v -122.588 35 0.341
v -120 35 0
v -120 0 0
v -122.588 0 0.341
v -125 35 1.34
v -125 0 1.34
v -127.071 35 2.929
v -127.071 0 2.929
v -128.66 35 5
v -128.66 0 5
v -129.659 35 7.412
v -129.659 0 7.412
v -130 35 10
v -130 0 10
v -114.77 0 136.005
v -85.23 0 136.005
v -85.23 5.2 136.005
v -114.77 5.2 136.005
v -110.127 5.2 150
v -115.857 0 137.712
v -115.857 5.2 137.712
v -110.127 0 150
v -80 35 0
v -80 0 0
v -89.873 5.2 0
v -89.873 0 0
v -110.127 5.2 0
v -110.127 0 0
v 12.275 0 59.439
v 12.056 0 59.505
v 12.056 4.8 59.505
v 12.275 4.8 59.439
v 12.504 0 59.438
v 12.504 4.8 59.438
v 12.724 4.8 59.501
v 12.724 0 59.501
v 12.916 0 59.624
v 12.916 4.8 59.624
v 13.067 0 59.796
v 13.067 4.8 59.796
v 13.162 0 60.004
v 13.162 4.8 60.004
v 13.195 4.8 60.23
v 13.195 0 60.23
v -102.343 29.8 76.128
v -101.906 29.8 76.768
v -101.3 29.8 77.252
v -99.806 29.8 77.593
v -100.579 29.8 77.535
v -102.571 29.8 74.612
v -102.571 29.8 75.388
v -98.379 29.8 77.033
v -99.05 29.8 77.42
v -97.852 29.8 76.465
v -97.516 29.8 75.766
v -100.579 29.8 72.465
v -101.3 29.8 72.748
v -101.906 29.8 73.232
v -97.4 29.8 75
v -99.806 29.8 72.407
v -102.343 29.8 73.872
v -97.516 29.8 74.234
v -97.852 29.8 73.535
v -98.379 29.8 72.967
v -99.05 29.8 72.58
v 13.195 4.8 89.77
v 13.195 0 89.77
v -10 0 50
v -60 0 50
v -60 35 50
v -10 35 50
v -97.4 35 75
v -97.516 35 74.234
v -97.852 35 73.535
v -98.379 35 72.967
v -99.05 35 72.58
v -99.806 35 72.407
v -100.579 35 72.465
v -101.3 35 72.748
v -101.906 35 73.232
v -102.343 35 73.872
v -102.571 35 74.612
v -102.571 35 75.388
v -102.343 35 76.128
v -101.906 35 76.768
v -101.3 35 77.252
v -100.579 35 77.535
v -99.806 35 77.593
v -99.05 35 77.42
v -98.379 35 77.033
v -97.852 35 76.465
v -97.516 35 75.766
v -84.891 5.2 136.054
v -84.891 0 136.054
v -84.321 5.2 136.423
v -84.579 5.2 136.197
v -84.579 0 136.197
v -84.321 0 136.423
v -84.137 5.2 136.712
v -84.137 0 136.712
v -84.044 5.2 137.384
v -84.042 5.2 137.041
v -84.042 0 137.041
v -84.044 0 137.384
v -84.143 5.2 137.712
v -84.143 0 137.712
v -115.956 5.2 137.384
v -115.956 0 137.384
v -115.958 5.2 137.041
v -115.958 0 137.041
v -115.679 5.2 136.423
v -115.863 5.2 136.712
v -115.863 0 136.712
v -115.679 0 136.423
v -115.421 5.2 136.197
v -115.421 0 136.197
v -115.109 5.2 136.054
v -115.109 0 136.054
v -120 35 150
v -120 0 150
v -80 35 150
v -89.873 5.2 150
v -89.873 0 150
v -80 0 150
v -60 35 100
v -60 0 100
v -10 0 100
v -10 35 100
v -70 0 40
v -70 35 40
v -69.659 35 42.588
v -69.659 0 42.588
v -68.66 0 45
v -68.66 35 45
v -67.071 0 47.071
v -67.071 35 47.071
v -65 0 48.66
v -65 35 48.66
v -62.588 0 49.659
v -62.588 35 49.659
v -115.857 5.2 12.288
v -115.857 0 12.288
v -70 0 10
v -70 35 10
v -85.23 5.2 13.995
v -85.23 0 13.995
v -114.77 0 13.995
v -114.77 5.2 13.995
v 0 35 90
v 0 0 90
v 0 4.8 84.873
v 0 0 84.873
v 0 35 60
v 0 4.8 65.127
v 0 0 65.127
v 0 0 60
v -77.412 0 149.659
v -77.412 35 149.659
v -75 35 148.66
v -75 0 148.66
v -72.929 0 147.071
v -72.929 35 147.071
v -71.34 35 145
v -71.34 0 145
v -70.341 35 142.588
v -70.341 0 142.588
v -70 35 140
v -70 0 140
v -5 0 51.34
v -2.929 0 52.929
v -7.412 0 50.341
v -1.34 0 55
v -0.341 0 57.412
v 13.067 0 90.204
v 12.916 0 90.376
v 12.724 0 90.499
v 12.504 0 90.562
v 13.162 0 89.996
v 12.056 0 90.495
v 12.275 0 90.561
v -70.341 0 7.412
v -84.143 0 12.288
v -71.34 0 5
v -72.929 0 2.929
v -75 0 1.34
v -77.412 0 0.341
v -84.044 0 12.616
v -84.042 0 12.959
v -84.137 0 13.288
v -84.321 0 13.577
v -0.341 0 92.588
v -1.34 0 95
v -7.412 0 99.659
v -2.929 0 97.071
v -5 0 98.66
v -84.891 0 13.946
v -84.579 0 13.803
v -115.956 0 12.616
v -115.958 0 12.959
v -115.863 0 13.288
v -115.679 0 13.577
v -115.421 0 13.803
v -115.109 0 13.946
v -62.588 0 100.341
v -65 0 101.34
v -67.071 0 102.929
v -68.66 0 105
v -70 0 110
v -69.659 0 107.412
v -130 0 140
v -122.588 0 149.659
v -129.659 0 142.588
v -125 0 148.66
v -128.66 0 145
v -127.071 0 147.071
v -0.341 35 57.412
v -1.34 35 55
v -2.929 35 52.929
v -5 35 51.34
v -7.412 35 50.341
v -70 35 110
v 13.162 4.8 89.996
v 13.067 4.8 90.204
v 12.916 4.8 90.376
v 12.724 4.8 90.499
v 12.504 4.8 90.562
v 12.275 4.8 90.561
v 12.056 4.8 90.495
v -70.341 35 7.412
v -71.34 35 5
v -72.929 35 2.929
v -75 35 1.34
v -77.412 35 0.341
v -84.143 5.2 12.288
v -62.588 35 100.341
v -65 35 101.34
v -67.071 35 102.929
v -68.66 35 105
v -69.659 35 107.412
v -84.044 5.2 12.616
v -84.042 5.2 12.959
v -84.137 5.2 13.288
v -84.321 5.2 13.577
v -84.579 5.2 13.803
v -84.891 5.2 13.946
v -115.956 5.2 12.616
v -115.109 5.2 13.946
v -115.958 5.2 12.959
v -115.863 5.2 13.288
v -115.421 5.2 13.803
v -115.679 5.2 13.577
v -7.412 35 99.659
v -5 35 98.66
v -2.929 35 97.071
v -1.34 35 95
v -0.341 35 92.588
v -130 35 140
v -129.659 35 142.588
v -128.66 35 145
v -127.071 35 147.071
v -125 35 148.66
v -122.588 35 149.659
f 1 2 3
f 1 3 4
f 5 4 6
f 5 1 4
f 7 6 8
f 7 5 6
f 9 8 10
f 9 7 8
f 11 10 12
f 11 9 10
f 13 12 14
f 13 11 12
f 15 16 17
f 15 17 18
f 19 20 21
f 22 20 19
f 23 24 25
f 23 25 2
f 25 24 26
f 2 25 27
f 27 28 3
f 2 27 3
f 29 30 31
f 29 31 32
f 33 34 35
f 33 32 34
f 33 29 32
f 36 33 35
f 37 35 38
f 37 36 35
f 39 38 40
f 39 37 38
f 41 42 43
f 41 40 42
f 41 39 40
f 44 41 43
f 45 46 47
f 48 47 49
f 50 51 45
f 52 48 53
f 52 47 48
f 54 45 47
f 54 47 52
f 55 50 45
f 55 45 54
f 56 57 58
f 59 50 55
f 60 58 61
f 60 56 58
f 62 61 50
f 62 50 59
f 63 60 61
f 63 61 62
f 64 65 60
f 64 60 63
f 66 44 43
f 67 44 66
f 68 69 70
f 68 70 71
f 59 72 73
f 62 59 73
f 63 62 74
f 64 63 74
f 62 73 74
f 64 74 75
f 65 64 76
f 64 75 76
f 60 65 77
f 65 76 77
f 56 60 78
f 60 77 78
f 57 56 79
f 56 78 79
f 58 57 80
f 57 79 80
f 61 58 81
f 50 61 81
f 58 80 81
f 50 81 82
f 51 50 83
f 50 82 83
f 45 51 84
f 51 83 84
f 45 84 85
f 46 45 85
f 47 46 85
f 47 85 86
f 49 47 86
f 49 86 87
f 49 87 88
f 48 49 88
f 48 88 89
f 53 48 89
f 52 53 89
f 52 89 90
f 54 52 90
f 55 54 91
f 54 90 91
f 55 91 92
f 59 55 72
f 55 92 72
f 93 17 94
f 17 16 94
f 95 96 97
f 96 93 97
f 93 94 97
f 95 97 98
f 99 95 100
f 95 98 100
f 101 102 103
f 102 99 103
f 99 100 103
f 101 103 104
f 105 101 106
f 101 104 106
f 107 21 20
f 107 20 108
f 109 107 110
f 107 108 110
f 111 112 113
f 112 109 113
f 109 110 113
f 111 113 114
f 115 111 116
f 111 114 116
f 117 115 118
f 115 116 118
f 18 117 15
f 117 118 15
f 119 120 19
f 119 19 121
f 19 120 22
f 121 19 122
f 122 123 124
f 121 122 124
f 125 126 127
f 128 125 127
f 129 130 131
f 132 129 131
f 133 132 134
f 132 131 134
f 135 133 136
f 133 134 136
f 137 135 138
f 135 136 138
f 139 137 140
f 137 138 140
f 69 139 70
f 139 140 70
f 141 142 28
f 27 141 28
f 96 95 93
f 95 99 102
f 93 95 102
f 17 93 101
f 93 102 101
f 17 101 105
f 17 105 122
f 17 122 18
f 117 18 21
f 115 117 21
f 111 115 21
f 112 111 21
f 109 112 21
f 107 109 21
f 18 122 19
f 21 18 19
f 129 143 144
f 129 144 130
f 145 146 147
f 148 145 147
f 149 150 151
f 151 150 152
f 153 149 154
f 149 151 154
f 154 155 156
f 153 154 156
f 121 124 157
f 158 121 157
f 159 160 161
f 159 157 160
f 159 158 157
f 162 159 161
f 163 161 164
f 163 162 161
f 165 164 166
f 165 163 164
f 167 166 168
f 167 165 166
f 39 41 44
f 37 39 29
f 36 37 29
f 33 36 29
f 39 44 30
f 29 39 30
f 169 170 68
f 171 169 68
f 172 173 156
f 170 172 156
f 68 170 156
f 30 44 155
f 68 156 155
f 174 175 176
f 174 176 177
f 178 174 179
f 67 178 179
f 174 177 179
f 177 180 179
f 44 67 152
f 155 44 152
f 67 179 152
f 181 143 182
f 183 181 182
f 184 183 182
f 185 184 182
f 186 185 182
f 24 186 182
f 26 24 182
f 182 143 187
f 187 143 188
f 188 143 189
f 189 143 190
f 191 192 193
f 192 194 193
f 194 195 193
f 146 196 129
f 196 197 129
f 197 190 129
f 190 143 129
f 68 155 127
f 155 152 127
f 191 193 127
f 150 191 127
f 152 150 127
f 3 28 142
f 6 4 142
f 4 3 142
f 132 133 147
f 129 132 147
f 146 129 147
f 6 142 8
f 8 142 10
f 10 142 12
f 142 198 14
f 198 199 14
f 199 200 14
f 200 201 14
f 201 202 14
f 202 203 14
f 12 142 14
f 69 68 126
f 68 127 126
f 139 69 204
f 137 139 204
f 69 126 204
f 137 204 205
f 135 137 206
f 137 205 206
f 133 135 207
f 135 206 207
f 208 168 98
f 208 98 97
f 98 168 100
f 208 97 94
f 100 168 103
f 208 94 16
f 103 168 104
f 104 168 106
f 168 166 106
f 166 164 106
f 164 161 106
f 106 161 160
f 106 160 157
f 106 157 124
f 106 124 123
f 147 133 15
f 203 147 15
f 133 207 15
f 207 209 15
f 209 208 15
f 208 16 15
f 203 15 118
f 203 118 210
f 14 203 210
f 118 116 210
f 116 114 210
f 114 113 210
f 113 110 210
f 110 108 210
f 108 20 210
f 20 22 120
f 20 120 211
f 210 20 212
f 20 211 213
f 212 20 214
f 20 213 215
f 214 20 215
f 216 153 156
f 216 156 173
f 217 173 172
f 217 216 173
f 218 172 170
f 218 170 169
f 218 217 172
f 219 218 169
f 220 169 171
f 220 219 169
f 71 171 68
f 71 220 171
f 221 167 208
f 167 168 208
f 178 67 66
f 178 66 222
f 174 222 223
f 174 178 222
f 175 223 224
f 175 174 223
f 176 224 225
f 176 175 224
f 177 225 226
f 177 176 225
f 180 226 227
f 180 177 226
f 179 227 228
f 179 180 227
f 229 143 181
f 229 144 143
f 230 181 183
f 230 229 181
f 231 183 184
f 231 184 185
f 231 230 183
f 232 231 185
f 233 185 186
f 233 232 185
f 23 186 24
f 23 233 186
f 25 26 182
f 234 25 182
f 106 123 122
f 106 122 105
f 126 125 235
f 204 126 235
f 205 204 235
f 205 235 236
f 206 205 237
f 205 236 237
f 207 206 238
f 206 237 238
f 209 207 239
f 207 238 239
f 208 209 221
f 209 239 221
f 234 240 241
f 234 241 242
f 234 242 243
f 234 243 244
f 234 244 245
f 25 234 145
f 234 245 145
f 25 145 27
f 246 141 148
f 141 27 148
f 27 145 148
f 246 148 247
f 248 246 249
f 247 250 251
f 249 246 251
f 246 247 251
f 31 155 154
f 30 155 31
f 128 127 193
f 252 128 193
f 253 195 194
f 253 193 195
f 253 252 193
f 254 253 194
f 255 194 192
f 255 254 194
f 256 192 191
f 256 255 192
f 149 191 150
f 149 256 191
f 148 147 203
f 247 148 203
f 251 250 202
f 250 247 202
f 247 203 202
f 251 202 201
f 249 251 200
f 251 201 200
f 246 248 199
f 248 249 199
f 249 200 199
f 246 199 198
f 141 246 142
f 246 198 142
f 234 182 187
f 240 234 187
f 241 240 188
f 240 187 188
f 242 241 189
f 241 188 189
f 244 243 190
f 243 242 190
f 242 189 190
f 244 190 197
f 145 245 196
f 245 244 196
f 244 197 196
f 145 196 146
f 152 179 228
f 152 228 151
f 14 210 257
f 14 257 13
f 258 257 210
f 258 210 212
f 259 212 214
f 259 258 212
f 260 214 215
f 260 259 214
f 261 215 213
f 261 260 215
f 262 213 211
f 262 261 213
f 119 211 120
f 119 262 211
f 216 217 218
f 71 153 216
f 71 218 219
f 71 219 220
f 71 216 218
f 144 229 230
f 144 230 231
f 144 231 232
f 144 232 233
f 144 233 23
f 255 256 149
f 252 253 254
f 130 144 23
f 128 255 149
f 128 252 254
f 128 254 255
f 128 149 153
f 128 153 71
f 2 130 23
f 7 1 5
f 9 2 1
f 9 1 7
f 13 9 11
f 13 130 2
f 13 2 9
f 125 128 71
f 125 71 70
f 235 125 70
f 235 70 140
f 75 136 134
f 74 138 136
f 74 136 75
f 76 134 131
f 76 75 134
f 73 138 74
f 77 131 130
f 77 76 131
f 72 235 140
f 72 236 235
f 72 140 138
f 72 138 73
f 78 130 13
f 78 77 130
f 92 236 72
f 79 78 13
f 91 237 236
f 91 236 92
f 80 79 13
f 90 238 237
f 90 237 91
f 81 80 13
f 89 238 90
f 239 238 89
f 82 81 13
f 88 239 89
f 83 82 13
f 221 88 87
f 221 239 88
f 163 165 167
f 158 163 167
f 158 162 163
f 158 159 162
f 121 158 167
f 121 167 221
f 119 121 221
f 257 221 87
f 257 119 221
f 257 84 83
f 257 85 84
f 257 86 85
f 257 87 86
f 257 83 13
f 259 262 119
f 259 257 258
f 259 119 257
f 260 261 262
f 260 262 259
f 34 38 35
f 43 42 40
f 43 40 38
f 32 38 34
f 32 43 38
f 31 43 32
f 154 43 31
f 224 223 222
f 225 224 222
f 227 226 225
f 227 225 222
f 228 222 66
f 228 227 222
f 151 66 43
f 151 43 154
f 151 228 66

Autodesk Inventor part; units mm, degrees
ref_plane "YZ Plane" through (0, 0, 0) normal (1, 0, 0) x (0, 1, 0)
ref_plane "XZ Plane" through (0, 0, 0) normal (0, 1, 0) x (-1, 0, 0)
ref_plane "XY Plane" through (0, 0, 0) normal (0, 0, 1) x (1, 0, 0)
sketch "Sketch1" plane through (0, 0, 0) normal (0, 1, 0) x (-1, 0, 0)
  line L0 (0, 0) -> (200, 0)
  line L1 (200, 0) -> (200, 150)
  line L2 (200, 150) -> (0, 150)
  line L3 (0, 150) -> (0, 0)
  line L4 (110.1274, 0) -> (89.8726, 0)
  line L5 (85.2304, 13.9946) -> (100, 13.9946)
  line L6 (89.8726, 0) -> (84.1428, 12.2875)
  arc A0 (85.2304, 13.9946) -> (84.1428, 12.2875) centre (85.2304, 12.7946) ccw
  line L7 (100, 13.9946) -> (114.7696, 13.9946)
  line L8 (110, 0.2) -> (110, 13.6303) construction
  arc A1 (115.8572, 12.2875) -> (114.7696, 13.9946) centre (114.7696, 12.7946) ccw
  line L9 (115.8572, 12.2875) -> (110.1274, 0)
  arc A2 (114.7696, 136.0054) -> (115.8572, 137.7125) centre (114.7696, 137.2054) ccw
  line L10 (100, 136.0054) -> (114.7696, 136.0054)
  line L11 (115.8572, 137.7125) -> (110.1274, 150)
  line L12 (110, 149.8) -> (110, 136.3697) construction
  line L13 (85.2304, 136.0054) -> (100, 136.0054)
  arc A3 (84.1428, 137.7125) -> (85.2304, 136.0054) centre (85.2304, 137.2054) ccw
  line L14 (110.1274, 150) -> (89.8726, 150)
  line L15 (89.8726, 150) -> (84.1428, 137.7125)
  line L16 (0.2, 85) -> (-13.2303, 85) construction
  line L17 (-13.1946, 75) -> (-13.1946, 89.7696)
  arc A4 (-12.0565, 90.4946) -> (-13.1946, 89.7696) centre (-12.3946, 89.7696) ccw
  line L18 (-12.0565, 90.4946) -> (0, 84.8726)
  line L19 (0, 84.8726) -> (0, 65.1274)
  line L20 (0, 65.1274) -> (-12.0565, 59.5054)
  arc A5 (-13.1946, 60.2304) -> (-12.0565, 59.5054) centre (-12.3946, 60.2304) ccw
  line L21 (-13.1946, 60.2304) -> (-13.1946, 75)
  point P0 (100, 0)
  point P1 (100, 150)
  point P2 (0, 75)
  point P3 (100, 0)
  point P4 (100, 0)
  point P5 (116.3393, 13.7946)
  point P6 (100, 0)
  point P7 (100, 150)
  point P8 (116.3393, 136.2054)
  point P9 (100, 150)
  point P10 (100, 150)
  point P11 (100, 150)
  point P12 (0, 75)
  point P13 (0, 75)
  point P14 (0, 75)
  point P15 (0, 75)
  dimension "d0" = 200
  dimension "d1" = 150
  dimension "d2" = 15
extrude "Extrusion1" add sketch "Sketch1" along normal blind 35 contours L3 L2 L15 A3 L13 L10 A2 L11 L1 L0 L9 A1 L7 L5 A0 L6 | L6 A0 L5 L7 A1 L9 L0 | L2 L11 A2 L10 L13 A3 L15
extrude "Extrusion2" cut sketch "Sketch1" along normal blind 5.2 contours L6 A0 L5 L7 A1 L9 L0 | L2 L11 A2 L10 L13 A3 L15
extrude "Extrusion3" add sketch "Sketch1" along normal blind 4.8 contours L20 A5 L21 L17 A4 L18 L3
sketch "Sketch2" plane through (0, 35, 0) normal (0, 1, 0) x (1, 0, 0)
  line L0 (0, -84.8726) -> (0, -65.1274) projected
  line L1 (-200, 0) -> (-200, -150) projected
  circle A0 centre (-100, -75) radius 2.6
  point P0 (0, 0)
  dimension "d9" = 5.2
extrude "Extrusion4" cut sketch "Sketch2" against normal blind 5.2
sketch "Sketch3" plane through (0, 0, 0) normal (0, -1, 0) x (1, 0, 0)
  line L0 (-200, 0) -> (-200, 150) projected
  line L1 (0, 0) -> (-200, 0) projected
  line L2 (-200, 150) -> (-130, 150)
  line L3 (-130, 150) -> (-130, 0)
  line L4 (-130, 0) -> (-200, 0)
  line L5 (-200, 0) -> (-200, 150)
  line L6 (0, 150) -> (0, 84.8726) projected
  line L7 (0, 150) -> (-70, 150)
  line L8 (-70, 150) -> (-70, 100)
  line L9 (-70, 100) -> (0, 100)
  line L10 (0, 100) -> (0, 150)
  line L11 (0, 0) -> (-70, 0)
  line L12 (-70, 0) -> (-70, 50)
  line L13 (-70, 50) -> (0, 50)
  line L14 (0, 50) -> (0, 0)
  dimension "d12" = 70
  dimension "d13" = 70
  dimension "d14" = 50
  dimension "d15" = 70
  dimension "d16" = 50
extrude "Extrusion5" cut sketch "Sketch3" against normal blind 40
fillet "Fillet1" radius 10 8 edges at (0, 17.5, 100) (-70, 17.5, 100) (-70, 17.5, 150) (-130, 17.5, 150) (-130, 17.5, 0) (-70, 17.5, 0) (0, 17.5, 50) (-70, 17.5, 50)
properties part number "Area mh"
